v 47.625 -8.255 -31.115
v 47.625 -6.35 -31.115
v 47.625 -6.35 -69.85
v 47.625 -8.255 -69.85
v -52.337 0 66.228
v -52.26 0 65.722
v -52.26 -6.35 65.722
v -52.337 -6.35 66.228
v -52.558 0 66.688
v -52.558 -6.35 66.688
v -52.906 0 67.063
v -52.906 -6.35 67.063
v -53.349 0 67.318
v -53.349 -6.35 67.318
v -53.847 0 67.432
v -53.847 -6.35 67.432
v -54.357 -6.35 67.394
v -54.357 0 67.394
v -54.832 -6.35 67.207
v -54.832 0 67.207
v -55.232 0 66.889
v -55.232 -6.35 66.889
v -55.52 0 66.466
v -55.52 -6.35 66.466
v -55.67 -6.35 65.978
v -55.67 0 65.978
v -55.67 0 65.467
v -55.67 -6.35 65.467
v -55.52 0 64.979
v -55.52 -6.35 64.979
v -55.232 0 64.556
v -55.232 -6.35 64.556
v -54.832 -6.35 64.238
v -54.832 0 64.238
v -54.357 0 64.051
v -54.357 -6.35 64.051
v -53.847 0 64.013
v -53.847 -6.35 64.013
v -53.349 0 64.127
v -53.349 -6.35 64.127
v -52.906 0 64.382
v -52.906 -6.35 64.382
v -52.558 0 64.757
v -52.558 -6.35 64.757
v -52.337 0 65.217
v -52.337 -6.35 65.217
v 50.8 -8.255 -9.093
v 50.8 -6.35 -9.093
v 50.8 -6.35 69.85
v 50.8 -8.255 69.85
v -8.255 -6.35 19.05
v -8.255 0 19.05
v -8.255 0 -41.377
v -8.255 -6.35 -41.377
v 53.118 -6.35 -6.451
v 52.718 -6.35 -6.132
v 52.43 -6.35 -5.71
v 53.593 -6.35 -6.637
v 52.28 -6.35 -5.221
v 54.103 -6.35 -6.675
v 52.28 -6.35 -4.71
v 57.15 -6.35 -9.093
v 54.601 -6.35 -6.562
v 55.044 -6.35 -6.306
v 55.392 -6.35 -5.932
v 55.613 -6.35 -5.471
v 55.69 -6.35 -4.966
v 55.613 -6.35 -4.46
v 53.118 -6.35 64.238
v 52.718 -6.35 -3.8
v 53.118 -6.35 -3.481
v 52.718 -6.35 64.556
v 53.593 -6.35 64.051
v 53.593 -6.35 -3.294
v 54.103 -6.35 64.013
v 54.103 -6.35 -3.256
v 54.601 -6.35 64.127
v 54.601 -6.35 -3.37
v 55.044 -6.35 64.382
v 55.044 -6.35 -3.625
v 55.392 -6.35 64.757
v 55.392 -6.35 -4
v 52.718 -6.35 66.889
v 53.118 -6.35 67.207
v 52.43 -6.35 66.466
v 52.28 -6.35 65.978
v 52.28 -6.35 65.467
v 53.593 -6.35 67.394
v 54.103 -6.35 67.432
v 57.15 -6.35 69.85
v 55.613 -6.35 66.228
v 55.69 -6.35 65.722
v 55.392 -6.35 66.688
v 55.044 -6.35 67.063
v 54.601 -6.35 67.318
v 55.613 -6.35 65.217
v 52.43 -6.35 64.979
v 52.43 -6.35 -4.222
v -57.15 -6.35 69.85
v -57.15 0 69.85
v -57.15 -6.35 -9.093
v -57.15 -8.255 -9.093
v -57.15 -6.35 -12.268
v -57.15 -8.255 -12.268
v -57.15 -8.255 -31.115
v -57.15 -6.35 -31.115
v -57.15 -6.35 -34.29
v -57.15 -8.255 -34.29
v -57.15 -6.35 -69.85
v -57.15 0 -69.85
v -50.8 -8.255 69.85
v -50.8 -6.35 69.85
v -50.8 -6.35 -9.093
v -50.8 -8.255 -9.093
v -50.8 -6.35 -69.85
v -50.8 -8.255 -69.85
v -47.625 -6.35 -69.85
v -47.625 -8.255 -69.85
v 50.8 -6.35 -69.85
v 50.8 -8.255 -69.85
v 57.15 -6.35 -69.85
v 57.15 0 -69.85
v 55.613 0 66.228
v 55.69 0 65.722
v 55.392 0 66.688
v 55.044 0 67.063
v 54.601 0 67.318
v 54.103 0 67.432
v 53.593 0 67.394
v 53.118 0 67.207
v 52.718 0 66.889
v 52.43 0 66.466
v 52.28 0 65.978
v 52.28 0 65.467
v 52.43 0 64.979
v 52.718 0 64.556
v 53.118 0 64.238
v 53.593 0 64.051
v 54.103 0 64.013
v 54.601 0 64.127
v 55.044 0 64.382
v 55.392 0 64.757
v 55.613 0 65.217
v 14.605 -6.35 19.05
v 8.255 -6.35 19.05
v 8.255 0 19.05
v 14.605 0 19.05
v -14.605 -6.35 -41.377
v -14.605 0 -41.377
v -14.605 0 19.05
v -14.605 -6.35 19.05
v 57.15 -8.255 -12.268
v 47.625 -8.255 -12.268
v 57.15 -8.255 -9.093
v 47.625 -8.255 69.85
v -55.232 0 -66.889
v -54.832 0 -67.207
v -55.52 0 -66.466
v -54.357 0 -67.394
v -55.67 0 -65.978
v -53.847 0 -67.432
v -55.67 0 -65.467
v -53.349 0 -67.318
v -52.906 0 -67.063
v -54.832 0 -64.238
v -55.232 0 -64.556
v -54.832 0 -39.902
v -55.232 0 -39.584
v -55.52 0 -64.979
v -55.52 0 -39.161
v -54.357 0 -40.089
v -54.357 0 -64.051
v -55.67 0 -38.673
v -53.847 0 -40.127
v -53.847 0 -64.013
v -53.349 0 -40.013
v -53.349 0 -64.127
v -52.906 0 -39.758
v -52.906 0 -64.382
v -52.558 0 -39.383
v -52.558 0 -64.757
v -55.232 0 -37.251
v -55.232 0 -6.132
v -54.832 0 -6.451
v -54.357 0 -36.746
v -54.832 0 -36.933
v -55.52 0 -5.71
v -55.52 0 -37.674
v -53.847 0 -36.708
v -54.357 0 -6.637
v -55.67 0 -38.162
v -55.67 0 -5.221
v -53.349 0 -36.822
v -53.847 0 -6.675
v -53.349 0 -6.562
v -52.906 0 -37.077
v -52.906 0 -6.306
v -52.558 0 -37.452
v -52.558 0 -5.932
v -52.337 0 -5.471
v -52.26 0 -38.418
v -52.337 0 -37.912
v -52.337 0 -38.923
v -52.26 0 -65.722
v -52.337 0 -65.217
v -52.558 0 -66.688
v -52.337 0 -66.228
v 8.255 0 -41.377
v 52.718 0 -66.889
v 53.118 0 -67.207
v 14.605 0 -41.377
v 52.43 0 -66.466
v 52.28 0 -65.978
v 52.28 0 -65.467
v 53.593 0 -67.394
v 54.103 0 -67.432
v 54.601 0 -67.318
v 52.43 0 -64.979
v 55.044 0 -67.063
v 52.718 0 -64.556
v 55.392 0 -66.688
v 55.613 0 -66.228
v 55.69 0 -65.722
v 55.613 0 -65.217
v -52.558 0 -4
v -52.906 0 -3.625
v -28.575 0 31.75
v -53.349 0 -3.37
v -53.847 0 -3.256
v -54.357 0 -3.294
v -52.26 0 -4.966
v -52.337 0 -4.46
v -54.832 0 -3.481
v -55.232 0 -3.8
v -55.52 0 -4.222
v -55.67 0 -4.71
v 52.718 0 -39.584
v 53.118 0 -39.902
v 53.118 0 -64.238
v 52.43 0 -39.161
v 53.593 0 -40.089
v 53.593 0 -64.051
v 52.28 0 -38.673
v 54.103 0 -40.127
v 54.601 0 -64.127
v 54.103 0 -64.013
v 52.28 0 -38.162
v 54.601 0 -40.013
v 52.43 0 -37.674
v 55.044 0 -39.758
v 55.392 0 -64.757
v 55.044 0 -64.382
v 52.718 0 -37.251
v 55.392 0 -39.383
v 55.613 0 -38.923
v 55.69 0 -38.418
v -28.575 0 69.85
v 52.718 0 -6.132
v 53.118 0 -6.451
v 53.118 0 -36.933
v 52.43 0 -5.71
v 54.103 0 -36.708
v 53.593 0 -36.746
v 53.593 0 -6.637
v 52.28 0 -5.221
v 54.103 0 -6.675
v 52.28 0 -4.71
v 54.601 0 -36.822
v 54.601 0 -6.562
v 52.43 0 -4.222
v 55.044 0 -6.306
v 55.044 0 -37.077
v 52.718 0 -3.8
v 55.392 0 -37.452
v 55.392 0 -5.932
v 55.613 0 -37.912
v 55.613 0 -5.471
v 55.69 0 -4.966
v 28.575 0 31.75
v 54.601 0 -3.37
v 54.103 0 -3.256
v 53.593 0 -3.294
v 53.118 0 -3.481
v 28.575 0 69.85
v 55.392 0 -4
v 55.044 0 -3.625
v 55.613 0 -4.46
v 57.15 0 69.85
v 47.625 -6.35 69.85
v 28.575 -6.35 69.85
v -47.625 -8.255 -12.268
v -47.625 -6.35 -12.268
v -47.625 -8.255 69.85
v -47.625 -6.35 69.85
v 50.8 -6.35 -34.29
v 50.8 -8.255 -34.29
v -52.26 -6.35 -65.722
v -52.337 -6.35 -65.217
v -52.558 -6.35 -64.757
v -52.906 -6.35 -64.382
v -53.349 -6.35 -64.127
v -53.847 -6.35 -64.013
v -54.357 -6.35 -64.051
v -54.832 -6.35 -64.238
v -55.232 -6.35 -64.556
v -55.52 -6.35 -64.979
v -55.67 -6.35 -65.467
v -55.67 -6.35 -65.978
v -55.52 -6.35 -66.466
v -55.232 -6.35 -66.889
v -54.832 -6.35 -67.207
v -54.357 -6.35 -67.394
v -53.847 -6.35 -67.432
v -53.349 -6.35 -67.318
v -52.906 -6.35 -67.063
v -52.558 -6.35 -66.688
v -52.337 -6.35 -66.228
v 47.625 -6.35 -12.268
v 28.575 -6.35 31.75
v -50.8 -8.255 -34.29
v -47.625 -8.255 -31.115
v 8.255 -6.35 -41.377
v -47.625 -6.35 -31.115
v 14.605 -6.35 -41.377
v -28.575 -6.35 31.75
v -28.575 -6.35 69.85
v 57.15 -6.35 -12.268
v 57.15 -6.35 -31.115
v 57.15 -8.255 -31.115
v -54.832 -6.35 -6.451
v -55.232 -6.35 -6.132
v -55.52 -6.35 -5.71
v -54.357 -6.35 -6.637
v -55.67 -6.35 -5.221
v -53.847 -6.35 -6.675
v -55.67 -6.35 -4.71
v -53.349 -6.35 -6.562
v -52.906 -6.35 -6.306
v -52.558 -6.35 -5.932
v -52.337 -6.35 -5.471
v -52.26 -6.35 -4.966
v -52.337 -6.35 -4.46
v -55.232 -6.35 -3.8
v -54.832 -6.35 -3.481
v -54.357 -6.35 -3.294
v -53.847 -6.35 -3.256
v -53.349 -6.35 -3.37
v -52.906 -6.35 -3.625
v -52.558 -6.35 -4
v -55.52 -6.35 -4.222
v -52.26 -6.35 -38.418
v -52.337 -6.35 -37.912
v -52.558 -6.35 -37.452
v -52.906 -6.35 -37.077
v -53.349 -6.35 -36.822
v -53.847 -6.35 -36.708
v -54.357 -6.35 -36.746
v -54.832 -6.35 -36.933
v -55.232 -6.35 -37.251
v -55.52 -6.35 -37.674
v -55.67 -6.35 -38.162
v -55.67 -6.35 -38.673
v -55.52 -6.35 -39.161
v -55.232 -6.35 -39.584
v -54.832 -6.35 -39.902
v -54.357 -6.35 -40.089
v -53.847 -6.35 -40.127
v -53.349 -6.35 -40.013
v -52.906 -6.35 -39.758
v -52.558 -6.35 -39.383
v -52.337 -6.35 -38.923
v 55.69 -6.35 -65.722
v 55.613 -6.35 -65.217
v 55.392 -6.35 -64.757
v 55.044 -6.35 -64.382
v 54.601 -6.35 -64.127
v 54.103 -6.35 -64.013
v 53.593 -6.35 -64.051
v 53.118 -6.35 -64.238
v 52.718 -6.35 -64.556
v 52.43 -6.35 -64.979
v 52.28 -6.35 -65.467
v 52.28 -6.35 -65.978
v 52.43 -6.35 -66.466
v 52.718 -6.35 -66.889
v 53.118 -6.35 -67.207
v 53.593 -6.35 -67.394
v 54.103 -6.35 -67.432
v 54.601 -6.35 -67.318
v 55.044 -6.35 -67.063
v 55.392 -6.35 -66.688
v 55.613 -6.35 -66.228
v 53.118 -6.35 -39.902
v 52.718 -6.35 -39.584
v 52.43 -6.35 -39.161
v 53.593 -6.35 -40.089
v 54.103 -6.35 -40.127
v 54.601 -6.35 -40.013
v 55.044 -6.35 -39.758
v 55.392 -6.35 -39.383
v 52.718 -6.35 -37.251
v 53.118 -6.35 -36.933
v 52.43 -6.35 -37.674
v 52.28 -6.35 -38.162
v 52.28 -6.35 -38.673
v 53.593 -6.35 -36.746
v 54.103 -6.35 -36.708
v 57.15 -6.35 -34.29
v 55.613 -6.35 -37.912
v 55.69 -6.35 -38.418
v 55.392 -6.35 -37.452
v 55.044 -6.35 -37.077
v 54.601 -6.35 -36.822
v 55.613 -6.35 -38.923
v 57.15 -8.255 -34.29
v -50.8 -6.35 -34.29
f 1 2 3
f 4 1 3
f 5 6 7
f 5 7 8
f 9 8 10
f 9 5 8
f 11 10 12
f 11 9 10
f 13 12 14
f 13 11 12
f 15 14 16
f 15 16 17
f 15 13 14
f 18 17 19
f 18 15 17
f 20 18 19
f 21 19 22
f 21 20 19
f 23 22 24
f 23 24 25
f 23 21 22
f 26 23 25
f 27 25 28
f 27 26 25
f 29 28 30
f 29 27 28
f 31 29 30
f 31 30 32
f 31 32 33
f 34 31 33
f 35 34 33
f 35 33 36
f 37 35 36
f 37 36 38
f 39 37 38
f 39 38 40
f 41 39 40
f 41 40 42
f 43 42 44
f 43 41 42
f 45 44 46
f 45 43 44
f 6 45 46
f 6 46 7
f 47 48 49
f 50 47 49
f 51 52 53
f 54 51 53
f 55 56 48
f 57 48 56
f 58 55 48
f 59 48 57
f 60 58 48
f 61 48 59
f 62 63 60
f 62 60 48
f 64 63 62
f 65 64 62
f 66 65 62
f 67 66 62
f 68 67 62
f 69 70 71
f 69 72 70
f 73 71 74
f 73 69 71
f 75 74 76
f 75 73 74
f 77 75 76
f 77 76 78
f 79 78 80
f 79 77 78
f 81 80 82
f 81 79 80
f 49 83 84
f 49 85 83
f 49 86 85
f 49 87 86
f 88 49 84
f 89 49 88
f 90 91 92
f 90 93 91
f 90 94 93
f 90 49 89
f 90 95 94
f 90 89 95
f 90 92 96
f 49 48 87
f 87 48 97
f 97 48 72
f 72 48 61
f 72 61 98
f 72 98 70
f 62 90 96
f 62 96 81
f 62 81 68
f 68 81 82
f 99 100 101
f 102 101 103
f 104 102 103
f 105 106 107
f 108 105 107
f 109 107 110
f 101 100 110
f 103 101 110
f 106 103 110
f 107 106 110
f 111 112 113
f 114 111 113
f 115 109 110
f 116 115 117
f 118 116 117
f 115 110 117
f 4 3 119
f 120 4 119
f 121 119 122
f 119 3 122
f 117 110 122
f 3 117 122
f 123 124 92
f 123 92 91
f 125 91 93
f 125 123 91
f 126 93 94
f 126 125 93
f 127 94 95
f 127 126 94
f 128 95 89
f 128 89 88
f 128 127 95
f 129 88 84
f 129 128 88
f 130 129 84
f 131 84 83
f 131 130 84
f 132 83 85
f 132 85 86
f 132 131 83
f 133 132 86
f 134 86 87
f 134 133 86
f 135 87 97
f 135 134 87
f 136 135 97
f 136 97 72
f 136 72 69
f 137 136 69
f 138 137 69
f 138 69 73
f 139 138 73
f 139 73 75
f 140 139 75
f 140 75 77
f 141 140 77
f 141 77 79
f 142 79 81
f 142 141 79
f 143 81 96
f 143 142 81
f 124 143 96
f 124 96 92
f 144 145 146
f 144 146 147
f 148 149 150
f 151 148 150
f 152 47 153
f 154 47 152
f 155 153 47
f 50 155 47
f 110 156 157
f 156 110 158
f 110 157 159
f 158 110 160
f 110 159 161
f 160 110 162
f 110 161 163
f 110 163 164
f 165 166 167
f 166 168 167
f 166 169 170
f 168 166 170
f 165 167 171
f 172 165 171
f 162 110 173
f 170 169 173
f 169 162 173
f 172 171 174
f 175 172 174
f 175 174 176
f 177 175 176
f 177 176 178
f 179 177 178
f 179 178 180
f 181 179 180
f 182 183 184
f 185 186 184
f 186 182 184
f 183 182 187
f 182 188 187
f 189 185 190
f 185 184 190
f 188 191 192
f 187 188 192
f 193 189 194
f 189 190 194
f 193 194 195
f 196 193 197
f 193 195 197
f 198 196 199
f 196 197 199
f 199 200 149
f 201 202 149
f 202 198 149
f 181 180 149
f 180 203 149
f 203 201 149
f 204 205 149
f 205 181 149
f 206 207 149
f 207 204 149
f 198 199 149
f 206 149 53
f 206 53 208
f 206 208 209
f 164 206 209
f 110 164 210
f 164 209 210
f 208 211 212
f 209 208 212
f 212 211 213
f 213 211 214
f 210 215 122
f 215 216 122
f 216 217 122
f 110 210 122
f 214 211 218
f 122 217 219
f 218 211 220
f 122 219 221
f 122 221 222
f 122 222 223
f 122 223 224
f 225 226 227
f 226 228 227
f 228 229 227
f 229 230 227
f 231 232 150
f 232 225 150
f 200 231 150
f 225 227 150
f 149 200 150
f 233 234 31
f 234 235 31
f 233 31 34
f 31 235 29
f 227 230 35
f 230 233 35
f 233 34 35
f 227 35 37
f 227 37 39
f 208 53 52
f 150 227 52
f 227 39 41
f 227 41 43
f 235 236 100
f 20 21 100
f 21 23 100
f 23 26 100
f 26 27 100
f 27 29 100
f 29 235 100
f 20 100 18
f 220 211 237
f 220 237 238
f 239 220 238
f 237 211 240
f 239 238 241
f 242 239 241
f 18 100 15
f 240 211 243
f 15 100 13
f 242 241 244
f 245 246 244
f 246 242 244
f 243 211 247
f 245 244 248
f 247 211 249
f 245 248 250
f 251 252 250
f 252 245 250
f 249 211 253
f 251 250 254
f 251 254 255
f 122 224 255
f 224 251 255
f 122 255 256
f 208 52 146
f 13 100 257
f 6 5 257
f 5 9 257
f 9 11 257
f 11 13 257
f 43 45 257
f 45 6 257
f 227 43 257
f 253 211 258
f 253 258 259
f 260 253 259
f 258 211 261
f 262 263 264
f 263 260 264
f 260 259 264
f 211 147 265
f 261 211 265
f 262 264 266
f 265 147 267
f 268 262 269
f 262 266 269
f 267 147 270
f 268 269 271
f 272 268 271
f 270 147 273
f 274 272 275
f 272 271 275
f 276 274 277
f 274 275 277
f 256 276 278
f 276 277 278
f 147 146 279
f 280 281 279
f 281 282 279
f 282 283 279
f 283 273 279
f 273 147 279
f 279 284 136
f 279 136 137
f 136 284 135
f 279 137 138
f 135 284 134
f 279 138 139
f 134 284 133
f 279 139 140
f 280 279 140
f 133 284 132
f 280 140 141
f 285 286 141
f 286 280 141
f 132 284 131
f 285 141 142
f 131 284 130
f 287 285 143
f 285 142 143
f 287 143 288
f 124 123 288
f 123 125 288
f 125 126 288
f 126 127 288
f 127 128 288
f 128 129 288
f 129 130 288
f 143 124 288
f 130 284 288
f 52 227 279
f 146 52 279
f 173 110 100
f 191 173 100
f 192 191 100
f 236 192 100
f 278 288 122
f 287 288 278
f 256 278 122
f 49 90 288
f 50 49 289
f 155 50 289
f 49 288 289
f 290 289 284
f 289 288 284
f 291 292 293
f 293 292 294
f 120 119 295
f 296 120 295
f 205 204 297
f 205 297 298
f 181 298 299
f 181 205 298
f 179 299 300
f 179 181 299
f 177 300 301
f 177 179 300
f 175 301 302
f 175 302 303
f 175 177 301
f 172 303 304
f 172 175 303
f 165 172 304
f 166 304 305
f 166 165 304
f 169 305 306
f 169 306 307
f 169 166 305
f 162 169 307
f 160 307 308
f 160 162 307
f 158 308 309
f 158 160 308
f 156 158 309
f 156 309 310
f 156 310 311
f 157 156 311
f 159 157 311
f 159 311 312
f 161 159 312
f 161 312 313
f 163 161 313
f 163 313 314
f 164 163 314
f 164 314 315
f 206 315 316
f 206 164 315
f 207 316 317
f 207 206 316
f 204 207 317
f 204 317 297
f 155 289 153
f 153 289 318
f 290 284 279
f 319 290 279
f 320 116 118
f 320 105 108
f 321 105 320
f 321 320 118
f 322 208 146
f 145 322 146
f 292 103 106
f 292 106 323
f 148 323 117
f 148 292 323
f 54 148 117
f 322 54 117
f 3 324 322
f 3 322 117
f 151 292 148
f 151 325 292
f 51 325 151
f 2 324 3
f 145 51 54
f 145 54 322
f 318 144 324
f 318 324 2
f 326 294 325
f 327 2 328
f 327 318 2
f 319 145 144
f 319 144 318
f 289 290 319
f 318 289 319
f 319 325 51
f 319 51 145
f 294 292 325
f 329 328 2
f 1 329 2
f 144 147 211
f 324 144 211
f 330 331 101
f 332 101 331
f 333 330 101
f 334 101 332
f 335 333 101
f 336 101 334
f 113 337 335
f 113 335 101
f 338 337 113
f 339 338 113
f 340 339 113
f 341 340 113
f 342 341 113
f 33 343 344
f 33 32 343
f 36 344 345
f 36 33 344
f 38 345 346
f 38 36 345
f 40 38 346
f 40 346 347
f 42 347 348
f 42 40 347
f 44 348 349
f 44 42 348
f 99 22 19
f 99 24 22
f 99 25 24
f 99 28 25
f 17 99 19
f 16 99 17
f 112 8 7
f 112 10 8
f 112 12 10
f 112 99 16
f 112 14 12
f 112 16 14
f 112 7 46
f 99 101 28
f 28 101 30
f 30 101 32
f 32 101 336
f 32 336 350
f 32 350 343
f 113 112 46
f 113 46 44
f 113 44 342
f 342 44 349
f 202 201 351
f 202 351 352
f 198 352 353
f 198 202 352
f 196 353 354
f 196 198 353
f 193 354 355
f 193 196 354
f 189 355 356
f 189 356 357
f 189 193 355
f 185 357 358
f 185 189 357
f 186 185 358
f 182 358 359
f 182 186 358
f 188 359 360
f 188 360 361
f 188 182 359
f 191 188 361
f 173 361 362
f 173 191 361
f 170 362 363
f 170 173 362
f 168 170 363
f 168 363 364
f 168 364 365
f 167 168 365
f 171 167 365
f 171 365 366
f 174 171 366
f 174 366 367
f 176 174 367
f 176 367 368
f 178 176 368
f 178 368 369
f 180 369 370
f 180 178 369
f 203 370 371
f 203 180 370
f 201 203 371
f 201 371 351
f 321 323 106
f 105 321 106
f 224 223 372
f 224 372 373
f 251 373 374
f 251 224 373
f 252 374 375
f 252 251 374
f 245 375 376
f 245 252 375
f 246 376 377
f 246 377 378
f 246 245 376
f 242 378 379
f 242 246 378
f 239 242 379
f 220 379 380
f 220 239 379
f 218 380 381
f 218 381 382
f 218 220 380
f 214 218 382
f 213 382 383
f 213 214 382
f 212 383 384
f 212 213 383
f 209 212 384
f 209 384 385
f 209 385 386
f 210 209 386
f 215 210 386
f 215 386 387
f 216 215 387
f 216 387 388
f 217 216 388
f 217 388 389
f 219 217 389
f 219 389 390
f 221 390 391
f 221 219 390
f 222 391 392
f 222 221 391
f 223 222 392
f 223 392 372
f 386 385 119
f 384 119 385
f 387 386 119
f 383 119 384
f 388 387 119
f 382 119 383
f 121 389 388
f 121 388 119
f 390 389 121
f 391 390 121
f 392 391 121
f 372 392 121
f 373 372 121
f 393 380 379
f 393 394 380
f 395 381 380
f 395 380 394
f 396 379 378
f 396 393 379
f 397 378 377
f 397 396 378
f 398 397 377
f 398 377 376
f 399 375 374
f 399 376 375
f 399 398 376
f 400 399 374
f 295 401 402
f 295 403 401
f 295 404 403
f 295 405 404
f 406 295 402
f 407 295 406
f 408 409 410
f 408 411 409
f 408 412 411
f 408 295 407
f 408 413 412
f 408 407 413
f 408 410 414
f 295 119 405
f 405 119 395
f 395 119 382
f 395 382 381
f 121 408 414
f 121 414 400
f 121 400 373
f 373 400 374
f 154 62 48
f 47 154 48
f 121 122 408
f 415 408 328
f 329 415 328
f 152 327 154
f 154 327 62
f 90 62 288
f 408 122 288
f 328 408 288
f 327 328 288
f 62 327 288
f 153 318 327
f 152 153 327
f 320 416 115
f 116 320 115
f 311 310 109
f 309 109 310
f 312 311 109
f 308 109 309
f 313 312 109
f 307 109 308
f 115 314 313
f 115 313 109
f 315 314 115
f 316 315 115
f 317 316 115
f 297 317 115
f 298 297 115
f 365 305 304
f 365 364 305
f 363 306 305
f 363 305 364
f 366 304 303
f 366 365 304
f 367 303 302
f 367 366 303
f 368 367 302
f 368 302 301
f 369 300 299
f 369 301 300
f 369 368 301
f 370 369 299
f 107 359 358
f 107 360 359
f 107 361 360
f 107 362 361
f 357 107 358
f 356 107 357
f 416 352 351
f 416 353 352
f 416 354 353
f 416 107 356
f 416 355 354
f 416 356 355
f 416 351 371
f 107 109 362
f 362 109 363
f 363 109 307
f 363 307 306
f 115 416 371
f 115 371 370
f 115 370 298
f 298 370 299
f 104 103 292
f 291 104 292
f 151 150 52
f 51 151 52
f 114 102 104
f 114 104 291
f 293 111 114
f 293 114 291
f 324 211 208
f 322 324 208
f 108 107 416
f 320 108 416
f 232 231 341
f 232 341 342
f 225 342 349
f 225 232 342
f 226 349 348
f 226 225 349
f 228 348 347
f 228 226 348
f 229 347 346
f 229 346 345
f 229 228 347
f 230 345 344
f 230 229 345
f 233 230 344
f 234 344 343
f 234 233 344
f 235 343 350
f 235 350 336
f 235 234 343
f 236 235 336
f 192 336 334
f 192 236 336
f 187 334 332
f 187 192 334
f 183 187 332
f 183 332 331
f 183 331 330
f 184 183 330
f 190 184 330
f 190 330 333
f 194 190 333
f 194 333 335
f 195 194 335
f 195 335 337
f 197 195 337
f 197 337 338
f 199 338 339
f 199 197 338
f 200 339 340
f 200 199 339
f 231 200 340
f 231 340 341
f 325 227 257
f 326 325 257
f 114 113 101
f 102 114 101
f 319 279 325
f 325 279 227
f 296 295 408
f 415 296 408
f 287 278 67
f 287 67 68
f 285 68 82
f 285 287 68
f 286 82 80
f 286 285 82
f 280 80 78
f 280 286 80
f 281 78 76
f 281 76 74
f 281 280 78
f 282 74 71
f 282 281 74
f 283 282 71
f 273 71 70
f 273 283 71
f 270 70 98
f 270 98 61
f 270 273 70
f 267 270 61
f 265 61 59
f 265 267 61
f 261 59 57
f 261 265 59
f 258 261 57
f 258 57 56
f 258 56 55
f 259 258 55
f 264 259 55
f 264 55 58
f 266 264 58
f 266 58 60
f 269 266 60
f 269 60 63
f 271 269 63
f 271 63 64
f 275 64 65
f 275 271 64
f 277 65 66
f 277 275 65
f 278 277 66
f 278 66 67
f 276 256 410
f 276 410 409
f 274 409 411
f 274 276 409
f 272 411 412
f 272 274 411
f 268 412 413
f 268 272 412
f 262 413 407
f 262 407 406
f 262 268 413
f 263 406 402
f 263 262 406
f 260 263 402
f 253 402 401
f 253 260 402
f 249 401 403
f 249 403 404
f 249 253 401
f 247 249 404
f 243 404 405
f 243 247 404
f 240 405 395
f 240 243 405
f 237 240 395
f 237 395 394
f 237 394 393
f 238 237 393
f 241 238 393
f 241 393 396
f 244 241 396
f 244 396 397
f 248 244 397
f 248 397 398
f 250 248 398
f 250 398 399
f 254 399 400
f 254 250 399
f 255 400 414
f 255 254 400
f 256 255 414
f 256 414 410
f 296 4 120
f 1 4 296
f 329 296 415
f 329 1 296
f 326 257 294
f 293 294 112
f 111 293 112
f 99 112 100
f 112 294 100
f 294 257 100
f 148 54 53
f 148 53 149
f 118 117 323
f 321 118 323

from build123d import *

# Parameters (mm, degrees)
F0_W     = 6.35
F0_H     = 78.9432
F0_R     = 1.7145
F0_H_2   = 35.56
F1_DEPTH = 6.35
F2_DEPTH = 8.255


with BuildPart() as f1:
    # F0 (on Front) → F1 (new body)
    with BuildSketch(Plane.XZ):
        with Locations((-53.975, 30.3784)):
            Rectangle(F0_W, F0_H)
        with Locations((-53.975, -4.9657)):
            Circle(F0_R, mode=Mode.SUBTRACT)
        with Locations((-53.975, 65.7225)):
            Circle(F0_R, mode=Mode.SUBTRACT)
        with Locations((-53.975, -52.07)):
            Rectangle(F0_W, F0_H_2)
        with Locations((-53.975, -65.7225)):
            Circle(F0_R, mode=Mode.SUBTRACT)
        with Locations((-53.975, -38.4175)):
            Circle(F0_R, mode=Mode.SUBTRACT)
        with Locations((53.975, -52.07)):
            Rectangle(F0_W, F0_H_2)
        with Locations((53.975, -65.7225)):
            Circle(F0_R, mode=Mode.SUBTRACT)
        with Locations((53.975, -38.4175)):
            Circle(F0_R, mode=Mode.SUBTRACT)
        with Locations((53.975, 30.3784)):
            Rectangle(F0_W, F0_H)
        with Locations((53.975, -4.9657)):
            Circle(F0_R, mode=Mode.SUBTRACT)
        with Locations((53.975, 65.7225)):
            Circle(F0_R, mode=Mode.SUBTRACT)
        Polygon((-47.625, -69.85), (47.625, -69.85), (47.625, -31.115), (57.15, -31.115), (57.15, -12.2682), (47.625, -12.2682), (47.625, 69.85), (28.575, 69.85), (28.575, 31.75), (-28.575, 31.75), (-28.575, 69.85), (-47.625, 69.85), (-47.625, -12.2682), (-57.15, -12.2682), (-57.15, -31.115), (-47.625, -31.115), align=None)
        Polygon((-14.605, 15.875), (-14.605, 19.05), (-8.255, 19.05), (-8.255, 15.875), (-8.255, -38.2016), (-8.255, -41.3766), (-14.605, -41.3766), (-14.605, -38.2016), align=None, mode=Mode.SUBTRACT)
        Polygon((8.255, 15.875), (8.255, 19.05), (14.605, 19.05), (14.605, 15.875), (14.605, -38.2016), (14.605, -41.3766), (8.255, -41.3766), (8.255, -38.2016), align=None, mode=Mode.SUBTRACT)
    extrude(amount=F1_DEPTH)

    # F0 (on Front) → F2 (join)
    with BuildSketch(Plane.XZ):
        Polygon((47.625, -12.2682), (57.15, -12.2682), (57.15, -9.0932), (50.8, -9.0932), (50.8, 69.85), (47.625, 69.85), align=None)
        Polygon((47.625, -69.85), (50.8, -69.85), (50.8, -34.29), (57.15, -34.29), (57.15, -31.115), (47.625, -31.115), align=None)
        Polygon((-57.15, -9.0932), (-57.15, -12.2682), (-47.625, -12.2682), (-47.625, 69.85), (-50.8, 69.85), (-50.8, -9.0932), align=None)
        Polygon((-50.8, -69.85), (-47.625, -69.85), (-47.625, -31.115), (-57.15, -31.115), (-57.15, -34.29), (-50.8, -34.29), align=None)
    extrude(amount=F2_DEPTH)


solid = f1.part
